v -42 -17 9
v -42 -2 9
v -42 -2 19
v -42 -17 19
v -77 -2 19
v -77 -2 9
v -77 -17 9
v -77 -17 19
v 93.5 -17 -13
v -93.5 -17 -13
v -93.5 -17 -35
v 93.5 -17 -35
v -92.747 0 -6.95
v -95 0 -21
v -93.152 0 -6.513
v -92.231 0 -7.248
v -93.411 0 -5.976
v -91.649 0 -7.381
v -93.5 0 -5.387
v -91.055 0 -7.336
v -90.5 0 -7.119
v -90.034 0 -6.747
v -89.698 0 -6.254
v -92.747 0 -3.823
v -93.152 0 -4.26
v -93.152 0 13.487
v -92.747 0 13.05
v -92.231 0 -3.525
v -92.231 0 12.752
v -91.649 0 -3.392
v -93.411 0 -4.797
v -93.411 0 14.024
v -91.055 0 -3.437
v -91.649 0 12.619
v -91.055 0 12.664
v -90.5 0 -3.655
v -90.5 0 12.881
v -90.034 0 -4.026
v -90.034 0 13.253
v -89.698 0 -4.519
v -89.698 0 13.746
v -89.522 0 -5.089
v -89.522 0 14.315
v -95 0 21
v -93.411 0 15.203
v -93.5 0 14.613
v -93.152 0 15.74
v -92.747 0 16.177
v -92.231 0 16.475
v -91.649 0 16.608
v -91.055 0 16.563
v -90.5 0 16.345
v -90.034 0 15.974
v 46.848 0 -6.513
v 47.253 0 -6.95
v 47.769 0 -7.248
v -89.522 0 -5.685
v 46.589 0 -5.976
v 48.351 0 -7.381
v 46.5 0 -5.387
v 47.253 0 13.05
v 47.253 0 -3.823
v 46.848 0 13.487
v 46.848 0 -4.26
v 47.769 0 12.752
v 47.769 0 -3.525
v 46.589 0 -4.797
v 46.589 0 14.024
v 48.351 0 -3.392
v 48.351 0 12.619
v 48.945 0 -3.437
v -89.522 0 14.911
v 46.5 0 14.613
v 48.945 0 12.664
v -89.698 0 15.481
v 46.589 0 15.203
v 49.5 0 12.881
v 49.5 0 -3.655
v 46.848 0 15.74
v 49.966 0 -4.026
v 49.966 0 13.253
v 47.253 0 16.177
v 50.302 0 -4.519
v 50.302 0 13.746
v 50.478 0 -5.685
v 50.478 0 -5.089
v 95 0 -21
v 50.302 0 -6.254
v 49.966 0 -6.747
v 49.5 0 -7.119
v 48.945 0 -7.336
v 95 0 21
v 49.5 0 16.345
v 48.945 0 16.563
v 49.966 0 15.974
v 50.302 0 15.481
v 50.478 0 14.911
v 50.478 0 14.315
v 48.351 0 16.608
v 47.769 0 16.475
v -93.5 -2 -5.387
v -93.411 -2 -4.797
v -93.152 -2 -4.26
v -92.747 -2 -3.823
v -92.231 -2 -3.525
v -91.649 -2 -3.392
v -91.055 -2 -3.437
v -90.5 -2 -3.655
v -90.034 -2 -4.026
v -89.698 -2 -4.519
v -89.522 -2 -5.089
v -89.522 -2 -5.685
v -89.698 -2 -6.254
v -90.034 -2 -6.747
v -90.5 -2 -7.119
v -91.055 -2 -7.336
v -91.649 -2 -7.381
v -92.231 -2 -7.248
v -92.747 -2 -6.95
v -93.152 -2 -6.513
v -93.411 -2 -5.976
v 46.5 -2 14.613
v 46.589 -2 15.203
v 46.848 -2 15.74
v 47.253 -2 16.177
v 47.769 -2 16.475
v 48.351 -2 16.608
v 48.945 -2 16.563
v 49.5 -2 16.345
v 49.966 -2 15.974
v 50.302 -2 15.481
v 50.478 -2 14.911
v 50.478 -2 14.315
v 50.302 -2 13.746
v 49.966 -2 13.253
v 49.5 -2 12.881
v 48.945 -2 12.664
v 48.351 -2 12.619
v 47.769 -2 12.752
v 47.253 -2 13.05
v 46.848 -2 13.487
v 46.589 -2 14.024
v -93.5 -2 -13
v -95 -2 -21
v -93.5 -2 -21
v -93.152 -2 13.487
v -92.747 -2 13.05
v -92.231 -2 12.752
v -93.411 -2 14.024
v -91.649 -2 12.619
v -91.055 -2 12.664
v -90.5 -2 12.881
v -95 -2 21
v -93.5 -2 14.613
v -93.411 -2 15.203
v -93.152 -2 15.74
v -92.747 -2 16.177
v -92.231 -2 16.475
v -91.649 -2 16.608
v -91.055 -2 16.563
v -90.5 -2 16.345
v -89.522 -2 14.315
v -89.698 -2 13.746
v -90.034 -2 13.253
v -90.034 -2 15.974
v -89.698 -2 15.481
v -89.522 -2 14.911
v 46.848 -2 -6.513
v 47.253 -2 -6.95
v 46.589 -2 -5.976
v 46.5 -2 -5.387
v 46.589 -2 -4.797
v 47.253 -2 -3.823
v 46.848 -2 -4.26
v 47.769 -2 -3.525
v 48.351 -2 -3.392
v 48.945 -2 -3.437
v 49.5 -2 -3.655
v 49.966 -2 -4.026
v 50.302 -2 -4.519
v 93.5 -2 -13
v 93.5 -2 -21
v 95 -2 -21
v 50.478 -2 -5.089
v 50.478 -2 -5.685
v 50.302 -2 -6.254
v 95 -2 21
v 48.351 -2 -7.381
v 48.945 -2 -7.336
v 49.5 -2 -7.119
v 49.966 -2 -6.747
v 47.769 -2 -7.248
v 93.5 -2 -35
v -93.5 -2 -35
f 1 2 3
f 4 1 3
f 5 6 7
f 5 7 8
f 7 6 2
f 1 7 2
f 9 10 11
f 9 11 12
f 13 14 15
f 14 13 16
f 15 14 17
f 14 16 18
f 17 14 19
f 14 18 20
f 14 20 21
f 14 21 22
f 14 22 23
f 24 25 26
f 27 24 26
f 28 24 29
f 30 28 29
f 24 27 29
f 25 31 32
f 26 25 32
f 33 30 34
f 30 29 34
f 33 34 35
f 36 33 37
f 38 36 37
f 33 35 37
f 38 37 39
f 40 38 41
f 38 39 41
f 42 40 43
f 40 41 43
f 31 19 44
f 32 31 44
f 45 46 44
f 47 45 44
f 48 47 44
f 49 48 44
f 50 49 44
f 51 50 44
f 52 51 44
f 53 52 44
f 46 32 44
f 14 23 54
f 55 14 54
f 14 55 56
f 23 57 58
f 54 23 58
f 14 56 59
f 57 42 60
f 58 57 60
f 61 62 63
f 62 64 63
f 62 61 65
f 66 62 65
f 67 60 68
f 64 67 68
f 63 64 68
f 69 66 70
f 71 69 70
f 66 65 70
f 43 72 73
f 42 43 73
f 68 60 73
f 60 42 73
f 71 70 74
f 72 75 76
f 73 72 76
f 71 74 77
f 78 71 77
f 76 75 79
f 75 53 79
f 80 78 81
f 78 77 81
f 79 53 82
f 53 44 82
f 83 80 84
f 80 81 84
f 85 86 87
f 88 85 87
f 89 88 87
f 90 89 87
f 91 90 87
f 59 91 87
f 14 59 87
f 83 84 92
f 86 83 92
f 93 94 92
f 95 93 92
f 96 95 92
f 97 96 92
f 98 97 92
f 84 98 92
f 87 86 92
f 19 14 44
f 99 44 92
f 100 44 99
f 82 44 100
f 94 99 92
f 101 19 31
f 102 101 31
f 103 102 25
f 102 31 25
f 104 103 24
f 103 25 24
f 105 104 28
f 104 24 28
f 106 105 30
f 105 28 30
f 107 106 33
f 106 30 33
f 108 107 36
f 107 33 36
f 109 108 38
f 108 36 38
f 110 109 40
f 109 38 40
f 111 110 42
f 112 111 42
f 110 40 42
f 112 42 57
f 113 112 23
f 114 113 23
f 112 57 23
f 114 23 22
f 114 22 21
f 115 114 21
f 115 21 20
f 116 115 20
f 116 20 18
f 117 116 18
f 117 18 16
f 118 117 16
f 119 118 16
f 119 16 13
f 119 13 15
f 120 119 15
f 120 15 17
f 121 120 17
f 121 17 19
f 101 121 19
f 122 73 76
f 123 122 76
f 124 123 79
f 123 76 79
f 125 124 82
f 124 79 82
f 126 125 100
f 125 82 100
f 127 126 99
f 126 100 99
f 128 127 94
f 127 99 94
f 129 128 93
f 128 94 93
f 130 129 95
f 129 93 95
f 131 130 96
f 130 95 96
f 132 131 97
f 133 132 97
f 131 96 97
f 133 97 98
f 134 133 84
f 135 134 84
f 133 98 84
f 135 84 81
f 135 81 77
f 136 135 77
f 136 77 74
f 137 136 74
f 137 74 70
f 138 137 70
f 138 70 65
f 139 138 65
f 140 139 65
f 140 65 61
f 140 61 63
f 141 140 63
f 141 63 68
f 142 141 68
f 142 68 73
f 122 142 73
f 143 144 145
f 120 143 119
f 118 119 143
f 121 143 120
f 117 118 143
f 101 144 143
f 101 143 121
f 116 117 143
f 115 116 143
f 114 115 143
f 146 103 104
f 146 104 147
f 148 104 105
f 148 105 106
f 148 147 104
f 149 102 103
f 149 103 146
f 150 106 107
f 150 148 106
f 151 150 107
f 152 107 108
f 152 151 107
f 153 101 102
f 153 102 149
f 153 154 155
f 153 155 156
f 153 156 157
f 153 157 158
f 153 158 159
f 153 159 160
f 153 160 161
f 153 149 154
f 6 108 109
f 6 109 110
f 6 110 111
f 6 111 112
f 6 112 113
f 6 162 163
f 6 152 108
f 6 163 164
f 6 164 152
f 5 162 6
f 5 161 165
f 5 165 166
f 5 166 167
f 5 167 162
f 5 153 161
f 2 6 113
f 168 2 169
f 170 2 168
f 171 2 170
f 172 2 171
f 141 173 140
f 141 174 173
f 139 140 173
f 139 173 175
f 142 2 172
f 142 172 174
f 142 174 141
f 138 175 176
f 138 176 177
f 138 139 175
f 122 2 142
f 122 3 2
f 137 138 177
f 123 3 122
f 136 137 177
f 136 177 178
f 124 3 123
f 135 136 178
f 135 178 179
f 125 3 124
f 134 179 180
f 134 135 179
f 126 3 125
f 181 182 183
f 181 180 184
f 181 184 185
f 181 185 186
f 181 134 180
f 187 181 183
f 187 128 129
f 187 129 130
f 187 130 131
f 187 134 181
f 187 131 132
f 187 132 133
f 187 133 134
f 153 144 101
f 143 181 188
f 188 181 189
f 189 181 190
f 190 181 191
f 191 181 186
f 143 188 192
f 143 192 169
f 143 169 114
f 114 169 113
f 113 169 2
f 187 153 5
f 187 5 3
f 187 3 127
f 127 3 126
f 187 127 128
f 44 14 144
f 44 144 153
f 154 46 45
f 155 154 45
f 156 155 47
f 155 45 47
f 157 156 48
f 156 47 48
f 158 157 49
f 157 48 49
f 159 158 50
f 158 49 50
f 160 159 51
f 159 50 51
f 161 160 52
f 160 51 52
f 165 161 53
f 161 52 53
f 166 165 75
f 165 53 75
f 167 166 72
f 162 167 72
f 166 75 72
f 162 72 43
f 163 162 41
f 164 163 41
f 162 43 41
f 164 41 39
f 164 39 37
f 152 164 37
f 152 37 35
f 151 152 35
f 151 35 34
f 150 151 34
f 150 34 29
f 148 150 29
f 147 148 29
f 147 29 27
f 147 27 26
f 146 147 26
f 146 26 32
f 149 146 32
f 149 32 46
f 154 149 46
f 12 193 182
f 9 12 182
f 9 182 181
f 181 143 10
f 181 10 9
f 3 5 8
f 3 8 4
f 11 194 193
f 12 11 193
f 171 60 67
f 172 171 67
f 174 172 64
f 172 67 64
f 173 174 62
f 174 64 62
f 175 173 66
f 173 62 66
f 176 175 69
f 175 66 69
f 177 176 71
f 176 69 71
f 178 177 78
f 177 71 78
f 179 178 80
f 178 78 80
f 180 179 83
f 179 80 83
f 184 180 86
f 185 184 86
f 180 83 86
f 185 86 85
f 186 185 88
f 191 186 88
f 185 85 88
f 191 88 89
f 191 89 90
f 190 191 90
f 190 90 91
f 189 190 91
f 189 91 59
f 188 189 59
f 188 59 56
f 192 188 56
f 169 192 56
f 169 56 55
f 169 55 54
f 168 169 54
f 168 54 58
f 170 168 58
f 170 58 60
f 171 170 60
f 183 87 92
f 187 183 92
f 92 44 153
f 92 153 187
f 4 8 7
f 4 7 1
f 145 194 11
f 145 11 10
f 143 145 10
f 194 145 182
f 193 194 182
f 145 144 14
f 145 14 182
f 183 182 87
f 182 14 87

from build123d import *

# Parameters (mm, degrees)
F0_W     = 190
F0_H     = 42
F1_DEPTH = 2
F3_D     = 4
F4_W     = 35
F4_H     = 10
F4_W_2   = 187
F4_H_2   = 22
F5_DEPTH = 15


with BuildPart() as f1:
    # F0 (on Front) → F1 (new body)
    with BuildSketch(Plane.XZ):
        Rectangle(F0_W, F0_H)
    extrude(amount=F1_DEPTH)

    # F3 (through all)
    with Locations(Plane.XZ.offset(2)):
        with Locations((-91.5, 14.6134020761), (-91.5, -5.3865979239), (48.5, 14.6134020761), (48.5, -5.3865979239)):
            Hole(F3_D / 2)

    # F4 (on face) → F5 (join)
    with BuildSketch(Plane.XZ.offset(2)):
        with Locations((-59.5, 14)):
            Rectangle(F4_W, F4_H)
        with Locations((0, -24)):
            Rectangle(F4_W_2, F4_H_2)
    extrude(amount=F5_DEPTH)


solid = f1.part
